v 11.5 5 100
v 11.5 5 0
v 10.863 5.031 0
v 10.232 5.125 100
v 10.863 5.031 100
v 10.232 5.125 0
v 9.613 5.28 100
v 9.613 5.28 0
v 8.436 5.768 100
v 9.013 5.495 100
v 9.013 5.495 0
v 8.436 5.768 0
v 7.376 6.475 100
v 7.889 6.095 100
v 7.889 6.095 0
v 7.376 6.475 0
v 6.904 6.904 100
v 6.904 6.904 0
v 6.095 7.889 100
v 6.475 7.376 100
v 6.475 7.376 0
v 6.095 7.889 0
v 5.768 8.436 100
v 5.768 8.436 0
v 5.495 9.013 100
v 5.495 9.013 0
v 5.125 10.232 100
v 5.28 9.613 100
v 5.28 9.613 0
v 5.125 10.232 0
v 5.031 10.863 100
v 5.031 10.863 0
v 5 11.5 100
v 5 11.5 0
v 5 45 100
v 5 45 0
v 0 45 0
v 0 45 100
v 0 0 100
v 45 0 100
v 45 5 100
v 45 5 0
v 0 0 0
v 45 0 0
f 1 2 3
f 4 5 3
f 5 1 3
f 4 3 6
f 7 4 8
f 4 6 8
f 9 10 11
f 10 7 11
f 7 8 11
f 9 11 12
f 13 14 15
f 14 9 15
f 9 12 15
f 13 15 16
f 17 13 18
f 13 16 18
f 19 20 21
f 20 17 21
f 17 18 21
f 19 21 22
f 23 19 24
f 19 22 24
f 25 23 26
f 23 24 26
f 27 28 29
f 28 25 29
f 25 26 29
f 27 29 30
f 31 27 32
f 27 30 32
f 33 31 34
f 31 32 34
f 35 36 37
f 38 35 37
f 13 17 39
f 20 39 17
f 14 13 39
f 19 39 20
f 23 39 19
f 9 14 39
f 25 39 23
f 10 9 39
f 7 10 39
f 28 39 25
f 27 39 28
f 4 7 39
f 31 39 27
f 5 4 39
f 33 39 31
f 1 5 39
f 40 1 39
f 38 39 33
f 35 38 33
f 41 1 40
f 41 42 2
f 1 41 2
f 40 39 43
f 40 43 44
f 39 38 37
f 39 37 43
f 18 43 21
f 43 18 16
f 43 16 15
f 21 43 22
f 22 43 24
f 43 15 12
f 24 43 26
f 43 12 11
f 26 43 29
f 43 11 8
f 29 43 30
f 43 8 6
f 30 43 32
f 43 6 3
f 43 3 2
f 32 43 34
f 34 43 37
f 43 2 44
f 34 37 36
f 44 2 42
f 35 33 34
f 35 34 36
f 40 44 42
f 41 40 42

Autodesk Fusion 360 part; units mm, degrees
sketch "スケッチ1" plane through (0, 0, 0) normal (0, 0, 1) x (1, 0, 0)
  arc A0 (5, 11.5) -> (11.5, 5) centre (11.5, 11.5) ccw
  line L0 (0, 45) -> (0, 0)
  line L1 (45, 5) -> (11.5, 5)
  line L2 (0, 0) -> (45, 0)
  line L3 (45, 0) -> (45, 5)
  line L4 (5, 11.5) -> (5, 45)
  line L5 (5, 45) -> (0, 45)
extrude "押し出し1" add sketch "スケッチ1" along normal blind 100
